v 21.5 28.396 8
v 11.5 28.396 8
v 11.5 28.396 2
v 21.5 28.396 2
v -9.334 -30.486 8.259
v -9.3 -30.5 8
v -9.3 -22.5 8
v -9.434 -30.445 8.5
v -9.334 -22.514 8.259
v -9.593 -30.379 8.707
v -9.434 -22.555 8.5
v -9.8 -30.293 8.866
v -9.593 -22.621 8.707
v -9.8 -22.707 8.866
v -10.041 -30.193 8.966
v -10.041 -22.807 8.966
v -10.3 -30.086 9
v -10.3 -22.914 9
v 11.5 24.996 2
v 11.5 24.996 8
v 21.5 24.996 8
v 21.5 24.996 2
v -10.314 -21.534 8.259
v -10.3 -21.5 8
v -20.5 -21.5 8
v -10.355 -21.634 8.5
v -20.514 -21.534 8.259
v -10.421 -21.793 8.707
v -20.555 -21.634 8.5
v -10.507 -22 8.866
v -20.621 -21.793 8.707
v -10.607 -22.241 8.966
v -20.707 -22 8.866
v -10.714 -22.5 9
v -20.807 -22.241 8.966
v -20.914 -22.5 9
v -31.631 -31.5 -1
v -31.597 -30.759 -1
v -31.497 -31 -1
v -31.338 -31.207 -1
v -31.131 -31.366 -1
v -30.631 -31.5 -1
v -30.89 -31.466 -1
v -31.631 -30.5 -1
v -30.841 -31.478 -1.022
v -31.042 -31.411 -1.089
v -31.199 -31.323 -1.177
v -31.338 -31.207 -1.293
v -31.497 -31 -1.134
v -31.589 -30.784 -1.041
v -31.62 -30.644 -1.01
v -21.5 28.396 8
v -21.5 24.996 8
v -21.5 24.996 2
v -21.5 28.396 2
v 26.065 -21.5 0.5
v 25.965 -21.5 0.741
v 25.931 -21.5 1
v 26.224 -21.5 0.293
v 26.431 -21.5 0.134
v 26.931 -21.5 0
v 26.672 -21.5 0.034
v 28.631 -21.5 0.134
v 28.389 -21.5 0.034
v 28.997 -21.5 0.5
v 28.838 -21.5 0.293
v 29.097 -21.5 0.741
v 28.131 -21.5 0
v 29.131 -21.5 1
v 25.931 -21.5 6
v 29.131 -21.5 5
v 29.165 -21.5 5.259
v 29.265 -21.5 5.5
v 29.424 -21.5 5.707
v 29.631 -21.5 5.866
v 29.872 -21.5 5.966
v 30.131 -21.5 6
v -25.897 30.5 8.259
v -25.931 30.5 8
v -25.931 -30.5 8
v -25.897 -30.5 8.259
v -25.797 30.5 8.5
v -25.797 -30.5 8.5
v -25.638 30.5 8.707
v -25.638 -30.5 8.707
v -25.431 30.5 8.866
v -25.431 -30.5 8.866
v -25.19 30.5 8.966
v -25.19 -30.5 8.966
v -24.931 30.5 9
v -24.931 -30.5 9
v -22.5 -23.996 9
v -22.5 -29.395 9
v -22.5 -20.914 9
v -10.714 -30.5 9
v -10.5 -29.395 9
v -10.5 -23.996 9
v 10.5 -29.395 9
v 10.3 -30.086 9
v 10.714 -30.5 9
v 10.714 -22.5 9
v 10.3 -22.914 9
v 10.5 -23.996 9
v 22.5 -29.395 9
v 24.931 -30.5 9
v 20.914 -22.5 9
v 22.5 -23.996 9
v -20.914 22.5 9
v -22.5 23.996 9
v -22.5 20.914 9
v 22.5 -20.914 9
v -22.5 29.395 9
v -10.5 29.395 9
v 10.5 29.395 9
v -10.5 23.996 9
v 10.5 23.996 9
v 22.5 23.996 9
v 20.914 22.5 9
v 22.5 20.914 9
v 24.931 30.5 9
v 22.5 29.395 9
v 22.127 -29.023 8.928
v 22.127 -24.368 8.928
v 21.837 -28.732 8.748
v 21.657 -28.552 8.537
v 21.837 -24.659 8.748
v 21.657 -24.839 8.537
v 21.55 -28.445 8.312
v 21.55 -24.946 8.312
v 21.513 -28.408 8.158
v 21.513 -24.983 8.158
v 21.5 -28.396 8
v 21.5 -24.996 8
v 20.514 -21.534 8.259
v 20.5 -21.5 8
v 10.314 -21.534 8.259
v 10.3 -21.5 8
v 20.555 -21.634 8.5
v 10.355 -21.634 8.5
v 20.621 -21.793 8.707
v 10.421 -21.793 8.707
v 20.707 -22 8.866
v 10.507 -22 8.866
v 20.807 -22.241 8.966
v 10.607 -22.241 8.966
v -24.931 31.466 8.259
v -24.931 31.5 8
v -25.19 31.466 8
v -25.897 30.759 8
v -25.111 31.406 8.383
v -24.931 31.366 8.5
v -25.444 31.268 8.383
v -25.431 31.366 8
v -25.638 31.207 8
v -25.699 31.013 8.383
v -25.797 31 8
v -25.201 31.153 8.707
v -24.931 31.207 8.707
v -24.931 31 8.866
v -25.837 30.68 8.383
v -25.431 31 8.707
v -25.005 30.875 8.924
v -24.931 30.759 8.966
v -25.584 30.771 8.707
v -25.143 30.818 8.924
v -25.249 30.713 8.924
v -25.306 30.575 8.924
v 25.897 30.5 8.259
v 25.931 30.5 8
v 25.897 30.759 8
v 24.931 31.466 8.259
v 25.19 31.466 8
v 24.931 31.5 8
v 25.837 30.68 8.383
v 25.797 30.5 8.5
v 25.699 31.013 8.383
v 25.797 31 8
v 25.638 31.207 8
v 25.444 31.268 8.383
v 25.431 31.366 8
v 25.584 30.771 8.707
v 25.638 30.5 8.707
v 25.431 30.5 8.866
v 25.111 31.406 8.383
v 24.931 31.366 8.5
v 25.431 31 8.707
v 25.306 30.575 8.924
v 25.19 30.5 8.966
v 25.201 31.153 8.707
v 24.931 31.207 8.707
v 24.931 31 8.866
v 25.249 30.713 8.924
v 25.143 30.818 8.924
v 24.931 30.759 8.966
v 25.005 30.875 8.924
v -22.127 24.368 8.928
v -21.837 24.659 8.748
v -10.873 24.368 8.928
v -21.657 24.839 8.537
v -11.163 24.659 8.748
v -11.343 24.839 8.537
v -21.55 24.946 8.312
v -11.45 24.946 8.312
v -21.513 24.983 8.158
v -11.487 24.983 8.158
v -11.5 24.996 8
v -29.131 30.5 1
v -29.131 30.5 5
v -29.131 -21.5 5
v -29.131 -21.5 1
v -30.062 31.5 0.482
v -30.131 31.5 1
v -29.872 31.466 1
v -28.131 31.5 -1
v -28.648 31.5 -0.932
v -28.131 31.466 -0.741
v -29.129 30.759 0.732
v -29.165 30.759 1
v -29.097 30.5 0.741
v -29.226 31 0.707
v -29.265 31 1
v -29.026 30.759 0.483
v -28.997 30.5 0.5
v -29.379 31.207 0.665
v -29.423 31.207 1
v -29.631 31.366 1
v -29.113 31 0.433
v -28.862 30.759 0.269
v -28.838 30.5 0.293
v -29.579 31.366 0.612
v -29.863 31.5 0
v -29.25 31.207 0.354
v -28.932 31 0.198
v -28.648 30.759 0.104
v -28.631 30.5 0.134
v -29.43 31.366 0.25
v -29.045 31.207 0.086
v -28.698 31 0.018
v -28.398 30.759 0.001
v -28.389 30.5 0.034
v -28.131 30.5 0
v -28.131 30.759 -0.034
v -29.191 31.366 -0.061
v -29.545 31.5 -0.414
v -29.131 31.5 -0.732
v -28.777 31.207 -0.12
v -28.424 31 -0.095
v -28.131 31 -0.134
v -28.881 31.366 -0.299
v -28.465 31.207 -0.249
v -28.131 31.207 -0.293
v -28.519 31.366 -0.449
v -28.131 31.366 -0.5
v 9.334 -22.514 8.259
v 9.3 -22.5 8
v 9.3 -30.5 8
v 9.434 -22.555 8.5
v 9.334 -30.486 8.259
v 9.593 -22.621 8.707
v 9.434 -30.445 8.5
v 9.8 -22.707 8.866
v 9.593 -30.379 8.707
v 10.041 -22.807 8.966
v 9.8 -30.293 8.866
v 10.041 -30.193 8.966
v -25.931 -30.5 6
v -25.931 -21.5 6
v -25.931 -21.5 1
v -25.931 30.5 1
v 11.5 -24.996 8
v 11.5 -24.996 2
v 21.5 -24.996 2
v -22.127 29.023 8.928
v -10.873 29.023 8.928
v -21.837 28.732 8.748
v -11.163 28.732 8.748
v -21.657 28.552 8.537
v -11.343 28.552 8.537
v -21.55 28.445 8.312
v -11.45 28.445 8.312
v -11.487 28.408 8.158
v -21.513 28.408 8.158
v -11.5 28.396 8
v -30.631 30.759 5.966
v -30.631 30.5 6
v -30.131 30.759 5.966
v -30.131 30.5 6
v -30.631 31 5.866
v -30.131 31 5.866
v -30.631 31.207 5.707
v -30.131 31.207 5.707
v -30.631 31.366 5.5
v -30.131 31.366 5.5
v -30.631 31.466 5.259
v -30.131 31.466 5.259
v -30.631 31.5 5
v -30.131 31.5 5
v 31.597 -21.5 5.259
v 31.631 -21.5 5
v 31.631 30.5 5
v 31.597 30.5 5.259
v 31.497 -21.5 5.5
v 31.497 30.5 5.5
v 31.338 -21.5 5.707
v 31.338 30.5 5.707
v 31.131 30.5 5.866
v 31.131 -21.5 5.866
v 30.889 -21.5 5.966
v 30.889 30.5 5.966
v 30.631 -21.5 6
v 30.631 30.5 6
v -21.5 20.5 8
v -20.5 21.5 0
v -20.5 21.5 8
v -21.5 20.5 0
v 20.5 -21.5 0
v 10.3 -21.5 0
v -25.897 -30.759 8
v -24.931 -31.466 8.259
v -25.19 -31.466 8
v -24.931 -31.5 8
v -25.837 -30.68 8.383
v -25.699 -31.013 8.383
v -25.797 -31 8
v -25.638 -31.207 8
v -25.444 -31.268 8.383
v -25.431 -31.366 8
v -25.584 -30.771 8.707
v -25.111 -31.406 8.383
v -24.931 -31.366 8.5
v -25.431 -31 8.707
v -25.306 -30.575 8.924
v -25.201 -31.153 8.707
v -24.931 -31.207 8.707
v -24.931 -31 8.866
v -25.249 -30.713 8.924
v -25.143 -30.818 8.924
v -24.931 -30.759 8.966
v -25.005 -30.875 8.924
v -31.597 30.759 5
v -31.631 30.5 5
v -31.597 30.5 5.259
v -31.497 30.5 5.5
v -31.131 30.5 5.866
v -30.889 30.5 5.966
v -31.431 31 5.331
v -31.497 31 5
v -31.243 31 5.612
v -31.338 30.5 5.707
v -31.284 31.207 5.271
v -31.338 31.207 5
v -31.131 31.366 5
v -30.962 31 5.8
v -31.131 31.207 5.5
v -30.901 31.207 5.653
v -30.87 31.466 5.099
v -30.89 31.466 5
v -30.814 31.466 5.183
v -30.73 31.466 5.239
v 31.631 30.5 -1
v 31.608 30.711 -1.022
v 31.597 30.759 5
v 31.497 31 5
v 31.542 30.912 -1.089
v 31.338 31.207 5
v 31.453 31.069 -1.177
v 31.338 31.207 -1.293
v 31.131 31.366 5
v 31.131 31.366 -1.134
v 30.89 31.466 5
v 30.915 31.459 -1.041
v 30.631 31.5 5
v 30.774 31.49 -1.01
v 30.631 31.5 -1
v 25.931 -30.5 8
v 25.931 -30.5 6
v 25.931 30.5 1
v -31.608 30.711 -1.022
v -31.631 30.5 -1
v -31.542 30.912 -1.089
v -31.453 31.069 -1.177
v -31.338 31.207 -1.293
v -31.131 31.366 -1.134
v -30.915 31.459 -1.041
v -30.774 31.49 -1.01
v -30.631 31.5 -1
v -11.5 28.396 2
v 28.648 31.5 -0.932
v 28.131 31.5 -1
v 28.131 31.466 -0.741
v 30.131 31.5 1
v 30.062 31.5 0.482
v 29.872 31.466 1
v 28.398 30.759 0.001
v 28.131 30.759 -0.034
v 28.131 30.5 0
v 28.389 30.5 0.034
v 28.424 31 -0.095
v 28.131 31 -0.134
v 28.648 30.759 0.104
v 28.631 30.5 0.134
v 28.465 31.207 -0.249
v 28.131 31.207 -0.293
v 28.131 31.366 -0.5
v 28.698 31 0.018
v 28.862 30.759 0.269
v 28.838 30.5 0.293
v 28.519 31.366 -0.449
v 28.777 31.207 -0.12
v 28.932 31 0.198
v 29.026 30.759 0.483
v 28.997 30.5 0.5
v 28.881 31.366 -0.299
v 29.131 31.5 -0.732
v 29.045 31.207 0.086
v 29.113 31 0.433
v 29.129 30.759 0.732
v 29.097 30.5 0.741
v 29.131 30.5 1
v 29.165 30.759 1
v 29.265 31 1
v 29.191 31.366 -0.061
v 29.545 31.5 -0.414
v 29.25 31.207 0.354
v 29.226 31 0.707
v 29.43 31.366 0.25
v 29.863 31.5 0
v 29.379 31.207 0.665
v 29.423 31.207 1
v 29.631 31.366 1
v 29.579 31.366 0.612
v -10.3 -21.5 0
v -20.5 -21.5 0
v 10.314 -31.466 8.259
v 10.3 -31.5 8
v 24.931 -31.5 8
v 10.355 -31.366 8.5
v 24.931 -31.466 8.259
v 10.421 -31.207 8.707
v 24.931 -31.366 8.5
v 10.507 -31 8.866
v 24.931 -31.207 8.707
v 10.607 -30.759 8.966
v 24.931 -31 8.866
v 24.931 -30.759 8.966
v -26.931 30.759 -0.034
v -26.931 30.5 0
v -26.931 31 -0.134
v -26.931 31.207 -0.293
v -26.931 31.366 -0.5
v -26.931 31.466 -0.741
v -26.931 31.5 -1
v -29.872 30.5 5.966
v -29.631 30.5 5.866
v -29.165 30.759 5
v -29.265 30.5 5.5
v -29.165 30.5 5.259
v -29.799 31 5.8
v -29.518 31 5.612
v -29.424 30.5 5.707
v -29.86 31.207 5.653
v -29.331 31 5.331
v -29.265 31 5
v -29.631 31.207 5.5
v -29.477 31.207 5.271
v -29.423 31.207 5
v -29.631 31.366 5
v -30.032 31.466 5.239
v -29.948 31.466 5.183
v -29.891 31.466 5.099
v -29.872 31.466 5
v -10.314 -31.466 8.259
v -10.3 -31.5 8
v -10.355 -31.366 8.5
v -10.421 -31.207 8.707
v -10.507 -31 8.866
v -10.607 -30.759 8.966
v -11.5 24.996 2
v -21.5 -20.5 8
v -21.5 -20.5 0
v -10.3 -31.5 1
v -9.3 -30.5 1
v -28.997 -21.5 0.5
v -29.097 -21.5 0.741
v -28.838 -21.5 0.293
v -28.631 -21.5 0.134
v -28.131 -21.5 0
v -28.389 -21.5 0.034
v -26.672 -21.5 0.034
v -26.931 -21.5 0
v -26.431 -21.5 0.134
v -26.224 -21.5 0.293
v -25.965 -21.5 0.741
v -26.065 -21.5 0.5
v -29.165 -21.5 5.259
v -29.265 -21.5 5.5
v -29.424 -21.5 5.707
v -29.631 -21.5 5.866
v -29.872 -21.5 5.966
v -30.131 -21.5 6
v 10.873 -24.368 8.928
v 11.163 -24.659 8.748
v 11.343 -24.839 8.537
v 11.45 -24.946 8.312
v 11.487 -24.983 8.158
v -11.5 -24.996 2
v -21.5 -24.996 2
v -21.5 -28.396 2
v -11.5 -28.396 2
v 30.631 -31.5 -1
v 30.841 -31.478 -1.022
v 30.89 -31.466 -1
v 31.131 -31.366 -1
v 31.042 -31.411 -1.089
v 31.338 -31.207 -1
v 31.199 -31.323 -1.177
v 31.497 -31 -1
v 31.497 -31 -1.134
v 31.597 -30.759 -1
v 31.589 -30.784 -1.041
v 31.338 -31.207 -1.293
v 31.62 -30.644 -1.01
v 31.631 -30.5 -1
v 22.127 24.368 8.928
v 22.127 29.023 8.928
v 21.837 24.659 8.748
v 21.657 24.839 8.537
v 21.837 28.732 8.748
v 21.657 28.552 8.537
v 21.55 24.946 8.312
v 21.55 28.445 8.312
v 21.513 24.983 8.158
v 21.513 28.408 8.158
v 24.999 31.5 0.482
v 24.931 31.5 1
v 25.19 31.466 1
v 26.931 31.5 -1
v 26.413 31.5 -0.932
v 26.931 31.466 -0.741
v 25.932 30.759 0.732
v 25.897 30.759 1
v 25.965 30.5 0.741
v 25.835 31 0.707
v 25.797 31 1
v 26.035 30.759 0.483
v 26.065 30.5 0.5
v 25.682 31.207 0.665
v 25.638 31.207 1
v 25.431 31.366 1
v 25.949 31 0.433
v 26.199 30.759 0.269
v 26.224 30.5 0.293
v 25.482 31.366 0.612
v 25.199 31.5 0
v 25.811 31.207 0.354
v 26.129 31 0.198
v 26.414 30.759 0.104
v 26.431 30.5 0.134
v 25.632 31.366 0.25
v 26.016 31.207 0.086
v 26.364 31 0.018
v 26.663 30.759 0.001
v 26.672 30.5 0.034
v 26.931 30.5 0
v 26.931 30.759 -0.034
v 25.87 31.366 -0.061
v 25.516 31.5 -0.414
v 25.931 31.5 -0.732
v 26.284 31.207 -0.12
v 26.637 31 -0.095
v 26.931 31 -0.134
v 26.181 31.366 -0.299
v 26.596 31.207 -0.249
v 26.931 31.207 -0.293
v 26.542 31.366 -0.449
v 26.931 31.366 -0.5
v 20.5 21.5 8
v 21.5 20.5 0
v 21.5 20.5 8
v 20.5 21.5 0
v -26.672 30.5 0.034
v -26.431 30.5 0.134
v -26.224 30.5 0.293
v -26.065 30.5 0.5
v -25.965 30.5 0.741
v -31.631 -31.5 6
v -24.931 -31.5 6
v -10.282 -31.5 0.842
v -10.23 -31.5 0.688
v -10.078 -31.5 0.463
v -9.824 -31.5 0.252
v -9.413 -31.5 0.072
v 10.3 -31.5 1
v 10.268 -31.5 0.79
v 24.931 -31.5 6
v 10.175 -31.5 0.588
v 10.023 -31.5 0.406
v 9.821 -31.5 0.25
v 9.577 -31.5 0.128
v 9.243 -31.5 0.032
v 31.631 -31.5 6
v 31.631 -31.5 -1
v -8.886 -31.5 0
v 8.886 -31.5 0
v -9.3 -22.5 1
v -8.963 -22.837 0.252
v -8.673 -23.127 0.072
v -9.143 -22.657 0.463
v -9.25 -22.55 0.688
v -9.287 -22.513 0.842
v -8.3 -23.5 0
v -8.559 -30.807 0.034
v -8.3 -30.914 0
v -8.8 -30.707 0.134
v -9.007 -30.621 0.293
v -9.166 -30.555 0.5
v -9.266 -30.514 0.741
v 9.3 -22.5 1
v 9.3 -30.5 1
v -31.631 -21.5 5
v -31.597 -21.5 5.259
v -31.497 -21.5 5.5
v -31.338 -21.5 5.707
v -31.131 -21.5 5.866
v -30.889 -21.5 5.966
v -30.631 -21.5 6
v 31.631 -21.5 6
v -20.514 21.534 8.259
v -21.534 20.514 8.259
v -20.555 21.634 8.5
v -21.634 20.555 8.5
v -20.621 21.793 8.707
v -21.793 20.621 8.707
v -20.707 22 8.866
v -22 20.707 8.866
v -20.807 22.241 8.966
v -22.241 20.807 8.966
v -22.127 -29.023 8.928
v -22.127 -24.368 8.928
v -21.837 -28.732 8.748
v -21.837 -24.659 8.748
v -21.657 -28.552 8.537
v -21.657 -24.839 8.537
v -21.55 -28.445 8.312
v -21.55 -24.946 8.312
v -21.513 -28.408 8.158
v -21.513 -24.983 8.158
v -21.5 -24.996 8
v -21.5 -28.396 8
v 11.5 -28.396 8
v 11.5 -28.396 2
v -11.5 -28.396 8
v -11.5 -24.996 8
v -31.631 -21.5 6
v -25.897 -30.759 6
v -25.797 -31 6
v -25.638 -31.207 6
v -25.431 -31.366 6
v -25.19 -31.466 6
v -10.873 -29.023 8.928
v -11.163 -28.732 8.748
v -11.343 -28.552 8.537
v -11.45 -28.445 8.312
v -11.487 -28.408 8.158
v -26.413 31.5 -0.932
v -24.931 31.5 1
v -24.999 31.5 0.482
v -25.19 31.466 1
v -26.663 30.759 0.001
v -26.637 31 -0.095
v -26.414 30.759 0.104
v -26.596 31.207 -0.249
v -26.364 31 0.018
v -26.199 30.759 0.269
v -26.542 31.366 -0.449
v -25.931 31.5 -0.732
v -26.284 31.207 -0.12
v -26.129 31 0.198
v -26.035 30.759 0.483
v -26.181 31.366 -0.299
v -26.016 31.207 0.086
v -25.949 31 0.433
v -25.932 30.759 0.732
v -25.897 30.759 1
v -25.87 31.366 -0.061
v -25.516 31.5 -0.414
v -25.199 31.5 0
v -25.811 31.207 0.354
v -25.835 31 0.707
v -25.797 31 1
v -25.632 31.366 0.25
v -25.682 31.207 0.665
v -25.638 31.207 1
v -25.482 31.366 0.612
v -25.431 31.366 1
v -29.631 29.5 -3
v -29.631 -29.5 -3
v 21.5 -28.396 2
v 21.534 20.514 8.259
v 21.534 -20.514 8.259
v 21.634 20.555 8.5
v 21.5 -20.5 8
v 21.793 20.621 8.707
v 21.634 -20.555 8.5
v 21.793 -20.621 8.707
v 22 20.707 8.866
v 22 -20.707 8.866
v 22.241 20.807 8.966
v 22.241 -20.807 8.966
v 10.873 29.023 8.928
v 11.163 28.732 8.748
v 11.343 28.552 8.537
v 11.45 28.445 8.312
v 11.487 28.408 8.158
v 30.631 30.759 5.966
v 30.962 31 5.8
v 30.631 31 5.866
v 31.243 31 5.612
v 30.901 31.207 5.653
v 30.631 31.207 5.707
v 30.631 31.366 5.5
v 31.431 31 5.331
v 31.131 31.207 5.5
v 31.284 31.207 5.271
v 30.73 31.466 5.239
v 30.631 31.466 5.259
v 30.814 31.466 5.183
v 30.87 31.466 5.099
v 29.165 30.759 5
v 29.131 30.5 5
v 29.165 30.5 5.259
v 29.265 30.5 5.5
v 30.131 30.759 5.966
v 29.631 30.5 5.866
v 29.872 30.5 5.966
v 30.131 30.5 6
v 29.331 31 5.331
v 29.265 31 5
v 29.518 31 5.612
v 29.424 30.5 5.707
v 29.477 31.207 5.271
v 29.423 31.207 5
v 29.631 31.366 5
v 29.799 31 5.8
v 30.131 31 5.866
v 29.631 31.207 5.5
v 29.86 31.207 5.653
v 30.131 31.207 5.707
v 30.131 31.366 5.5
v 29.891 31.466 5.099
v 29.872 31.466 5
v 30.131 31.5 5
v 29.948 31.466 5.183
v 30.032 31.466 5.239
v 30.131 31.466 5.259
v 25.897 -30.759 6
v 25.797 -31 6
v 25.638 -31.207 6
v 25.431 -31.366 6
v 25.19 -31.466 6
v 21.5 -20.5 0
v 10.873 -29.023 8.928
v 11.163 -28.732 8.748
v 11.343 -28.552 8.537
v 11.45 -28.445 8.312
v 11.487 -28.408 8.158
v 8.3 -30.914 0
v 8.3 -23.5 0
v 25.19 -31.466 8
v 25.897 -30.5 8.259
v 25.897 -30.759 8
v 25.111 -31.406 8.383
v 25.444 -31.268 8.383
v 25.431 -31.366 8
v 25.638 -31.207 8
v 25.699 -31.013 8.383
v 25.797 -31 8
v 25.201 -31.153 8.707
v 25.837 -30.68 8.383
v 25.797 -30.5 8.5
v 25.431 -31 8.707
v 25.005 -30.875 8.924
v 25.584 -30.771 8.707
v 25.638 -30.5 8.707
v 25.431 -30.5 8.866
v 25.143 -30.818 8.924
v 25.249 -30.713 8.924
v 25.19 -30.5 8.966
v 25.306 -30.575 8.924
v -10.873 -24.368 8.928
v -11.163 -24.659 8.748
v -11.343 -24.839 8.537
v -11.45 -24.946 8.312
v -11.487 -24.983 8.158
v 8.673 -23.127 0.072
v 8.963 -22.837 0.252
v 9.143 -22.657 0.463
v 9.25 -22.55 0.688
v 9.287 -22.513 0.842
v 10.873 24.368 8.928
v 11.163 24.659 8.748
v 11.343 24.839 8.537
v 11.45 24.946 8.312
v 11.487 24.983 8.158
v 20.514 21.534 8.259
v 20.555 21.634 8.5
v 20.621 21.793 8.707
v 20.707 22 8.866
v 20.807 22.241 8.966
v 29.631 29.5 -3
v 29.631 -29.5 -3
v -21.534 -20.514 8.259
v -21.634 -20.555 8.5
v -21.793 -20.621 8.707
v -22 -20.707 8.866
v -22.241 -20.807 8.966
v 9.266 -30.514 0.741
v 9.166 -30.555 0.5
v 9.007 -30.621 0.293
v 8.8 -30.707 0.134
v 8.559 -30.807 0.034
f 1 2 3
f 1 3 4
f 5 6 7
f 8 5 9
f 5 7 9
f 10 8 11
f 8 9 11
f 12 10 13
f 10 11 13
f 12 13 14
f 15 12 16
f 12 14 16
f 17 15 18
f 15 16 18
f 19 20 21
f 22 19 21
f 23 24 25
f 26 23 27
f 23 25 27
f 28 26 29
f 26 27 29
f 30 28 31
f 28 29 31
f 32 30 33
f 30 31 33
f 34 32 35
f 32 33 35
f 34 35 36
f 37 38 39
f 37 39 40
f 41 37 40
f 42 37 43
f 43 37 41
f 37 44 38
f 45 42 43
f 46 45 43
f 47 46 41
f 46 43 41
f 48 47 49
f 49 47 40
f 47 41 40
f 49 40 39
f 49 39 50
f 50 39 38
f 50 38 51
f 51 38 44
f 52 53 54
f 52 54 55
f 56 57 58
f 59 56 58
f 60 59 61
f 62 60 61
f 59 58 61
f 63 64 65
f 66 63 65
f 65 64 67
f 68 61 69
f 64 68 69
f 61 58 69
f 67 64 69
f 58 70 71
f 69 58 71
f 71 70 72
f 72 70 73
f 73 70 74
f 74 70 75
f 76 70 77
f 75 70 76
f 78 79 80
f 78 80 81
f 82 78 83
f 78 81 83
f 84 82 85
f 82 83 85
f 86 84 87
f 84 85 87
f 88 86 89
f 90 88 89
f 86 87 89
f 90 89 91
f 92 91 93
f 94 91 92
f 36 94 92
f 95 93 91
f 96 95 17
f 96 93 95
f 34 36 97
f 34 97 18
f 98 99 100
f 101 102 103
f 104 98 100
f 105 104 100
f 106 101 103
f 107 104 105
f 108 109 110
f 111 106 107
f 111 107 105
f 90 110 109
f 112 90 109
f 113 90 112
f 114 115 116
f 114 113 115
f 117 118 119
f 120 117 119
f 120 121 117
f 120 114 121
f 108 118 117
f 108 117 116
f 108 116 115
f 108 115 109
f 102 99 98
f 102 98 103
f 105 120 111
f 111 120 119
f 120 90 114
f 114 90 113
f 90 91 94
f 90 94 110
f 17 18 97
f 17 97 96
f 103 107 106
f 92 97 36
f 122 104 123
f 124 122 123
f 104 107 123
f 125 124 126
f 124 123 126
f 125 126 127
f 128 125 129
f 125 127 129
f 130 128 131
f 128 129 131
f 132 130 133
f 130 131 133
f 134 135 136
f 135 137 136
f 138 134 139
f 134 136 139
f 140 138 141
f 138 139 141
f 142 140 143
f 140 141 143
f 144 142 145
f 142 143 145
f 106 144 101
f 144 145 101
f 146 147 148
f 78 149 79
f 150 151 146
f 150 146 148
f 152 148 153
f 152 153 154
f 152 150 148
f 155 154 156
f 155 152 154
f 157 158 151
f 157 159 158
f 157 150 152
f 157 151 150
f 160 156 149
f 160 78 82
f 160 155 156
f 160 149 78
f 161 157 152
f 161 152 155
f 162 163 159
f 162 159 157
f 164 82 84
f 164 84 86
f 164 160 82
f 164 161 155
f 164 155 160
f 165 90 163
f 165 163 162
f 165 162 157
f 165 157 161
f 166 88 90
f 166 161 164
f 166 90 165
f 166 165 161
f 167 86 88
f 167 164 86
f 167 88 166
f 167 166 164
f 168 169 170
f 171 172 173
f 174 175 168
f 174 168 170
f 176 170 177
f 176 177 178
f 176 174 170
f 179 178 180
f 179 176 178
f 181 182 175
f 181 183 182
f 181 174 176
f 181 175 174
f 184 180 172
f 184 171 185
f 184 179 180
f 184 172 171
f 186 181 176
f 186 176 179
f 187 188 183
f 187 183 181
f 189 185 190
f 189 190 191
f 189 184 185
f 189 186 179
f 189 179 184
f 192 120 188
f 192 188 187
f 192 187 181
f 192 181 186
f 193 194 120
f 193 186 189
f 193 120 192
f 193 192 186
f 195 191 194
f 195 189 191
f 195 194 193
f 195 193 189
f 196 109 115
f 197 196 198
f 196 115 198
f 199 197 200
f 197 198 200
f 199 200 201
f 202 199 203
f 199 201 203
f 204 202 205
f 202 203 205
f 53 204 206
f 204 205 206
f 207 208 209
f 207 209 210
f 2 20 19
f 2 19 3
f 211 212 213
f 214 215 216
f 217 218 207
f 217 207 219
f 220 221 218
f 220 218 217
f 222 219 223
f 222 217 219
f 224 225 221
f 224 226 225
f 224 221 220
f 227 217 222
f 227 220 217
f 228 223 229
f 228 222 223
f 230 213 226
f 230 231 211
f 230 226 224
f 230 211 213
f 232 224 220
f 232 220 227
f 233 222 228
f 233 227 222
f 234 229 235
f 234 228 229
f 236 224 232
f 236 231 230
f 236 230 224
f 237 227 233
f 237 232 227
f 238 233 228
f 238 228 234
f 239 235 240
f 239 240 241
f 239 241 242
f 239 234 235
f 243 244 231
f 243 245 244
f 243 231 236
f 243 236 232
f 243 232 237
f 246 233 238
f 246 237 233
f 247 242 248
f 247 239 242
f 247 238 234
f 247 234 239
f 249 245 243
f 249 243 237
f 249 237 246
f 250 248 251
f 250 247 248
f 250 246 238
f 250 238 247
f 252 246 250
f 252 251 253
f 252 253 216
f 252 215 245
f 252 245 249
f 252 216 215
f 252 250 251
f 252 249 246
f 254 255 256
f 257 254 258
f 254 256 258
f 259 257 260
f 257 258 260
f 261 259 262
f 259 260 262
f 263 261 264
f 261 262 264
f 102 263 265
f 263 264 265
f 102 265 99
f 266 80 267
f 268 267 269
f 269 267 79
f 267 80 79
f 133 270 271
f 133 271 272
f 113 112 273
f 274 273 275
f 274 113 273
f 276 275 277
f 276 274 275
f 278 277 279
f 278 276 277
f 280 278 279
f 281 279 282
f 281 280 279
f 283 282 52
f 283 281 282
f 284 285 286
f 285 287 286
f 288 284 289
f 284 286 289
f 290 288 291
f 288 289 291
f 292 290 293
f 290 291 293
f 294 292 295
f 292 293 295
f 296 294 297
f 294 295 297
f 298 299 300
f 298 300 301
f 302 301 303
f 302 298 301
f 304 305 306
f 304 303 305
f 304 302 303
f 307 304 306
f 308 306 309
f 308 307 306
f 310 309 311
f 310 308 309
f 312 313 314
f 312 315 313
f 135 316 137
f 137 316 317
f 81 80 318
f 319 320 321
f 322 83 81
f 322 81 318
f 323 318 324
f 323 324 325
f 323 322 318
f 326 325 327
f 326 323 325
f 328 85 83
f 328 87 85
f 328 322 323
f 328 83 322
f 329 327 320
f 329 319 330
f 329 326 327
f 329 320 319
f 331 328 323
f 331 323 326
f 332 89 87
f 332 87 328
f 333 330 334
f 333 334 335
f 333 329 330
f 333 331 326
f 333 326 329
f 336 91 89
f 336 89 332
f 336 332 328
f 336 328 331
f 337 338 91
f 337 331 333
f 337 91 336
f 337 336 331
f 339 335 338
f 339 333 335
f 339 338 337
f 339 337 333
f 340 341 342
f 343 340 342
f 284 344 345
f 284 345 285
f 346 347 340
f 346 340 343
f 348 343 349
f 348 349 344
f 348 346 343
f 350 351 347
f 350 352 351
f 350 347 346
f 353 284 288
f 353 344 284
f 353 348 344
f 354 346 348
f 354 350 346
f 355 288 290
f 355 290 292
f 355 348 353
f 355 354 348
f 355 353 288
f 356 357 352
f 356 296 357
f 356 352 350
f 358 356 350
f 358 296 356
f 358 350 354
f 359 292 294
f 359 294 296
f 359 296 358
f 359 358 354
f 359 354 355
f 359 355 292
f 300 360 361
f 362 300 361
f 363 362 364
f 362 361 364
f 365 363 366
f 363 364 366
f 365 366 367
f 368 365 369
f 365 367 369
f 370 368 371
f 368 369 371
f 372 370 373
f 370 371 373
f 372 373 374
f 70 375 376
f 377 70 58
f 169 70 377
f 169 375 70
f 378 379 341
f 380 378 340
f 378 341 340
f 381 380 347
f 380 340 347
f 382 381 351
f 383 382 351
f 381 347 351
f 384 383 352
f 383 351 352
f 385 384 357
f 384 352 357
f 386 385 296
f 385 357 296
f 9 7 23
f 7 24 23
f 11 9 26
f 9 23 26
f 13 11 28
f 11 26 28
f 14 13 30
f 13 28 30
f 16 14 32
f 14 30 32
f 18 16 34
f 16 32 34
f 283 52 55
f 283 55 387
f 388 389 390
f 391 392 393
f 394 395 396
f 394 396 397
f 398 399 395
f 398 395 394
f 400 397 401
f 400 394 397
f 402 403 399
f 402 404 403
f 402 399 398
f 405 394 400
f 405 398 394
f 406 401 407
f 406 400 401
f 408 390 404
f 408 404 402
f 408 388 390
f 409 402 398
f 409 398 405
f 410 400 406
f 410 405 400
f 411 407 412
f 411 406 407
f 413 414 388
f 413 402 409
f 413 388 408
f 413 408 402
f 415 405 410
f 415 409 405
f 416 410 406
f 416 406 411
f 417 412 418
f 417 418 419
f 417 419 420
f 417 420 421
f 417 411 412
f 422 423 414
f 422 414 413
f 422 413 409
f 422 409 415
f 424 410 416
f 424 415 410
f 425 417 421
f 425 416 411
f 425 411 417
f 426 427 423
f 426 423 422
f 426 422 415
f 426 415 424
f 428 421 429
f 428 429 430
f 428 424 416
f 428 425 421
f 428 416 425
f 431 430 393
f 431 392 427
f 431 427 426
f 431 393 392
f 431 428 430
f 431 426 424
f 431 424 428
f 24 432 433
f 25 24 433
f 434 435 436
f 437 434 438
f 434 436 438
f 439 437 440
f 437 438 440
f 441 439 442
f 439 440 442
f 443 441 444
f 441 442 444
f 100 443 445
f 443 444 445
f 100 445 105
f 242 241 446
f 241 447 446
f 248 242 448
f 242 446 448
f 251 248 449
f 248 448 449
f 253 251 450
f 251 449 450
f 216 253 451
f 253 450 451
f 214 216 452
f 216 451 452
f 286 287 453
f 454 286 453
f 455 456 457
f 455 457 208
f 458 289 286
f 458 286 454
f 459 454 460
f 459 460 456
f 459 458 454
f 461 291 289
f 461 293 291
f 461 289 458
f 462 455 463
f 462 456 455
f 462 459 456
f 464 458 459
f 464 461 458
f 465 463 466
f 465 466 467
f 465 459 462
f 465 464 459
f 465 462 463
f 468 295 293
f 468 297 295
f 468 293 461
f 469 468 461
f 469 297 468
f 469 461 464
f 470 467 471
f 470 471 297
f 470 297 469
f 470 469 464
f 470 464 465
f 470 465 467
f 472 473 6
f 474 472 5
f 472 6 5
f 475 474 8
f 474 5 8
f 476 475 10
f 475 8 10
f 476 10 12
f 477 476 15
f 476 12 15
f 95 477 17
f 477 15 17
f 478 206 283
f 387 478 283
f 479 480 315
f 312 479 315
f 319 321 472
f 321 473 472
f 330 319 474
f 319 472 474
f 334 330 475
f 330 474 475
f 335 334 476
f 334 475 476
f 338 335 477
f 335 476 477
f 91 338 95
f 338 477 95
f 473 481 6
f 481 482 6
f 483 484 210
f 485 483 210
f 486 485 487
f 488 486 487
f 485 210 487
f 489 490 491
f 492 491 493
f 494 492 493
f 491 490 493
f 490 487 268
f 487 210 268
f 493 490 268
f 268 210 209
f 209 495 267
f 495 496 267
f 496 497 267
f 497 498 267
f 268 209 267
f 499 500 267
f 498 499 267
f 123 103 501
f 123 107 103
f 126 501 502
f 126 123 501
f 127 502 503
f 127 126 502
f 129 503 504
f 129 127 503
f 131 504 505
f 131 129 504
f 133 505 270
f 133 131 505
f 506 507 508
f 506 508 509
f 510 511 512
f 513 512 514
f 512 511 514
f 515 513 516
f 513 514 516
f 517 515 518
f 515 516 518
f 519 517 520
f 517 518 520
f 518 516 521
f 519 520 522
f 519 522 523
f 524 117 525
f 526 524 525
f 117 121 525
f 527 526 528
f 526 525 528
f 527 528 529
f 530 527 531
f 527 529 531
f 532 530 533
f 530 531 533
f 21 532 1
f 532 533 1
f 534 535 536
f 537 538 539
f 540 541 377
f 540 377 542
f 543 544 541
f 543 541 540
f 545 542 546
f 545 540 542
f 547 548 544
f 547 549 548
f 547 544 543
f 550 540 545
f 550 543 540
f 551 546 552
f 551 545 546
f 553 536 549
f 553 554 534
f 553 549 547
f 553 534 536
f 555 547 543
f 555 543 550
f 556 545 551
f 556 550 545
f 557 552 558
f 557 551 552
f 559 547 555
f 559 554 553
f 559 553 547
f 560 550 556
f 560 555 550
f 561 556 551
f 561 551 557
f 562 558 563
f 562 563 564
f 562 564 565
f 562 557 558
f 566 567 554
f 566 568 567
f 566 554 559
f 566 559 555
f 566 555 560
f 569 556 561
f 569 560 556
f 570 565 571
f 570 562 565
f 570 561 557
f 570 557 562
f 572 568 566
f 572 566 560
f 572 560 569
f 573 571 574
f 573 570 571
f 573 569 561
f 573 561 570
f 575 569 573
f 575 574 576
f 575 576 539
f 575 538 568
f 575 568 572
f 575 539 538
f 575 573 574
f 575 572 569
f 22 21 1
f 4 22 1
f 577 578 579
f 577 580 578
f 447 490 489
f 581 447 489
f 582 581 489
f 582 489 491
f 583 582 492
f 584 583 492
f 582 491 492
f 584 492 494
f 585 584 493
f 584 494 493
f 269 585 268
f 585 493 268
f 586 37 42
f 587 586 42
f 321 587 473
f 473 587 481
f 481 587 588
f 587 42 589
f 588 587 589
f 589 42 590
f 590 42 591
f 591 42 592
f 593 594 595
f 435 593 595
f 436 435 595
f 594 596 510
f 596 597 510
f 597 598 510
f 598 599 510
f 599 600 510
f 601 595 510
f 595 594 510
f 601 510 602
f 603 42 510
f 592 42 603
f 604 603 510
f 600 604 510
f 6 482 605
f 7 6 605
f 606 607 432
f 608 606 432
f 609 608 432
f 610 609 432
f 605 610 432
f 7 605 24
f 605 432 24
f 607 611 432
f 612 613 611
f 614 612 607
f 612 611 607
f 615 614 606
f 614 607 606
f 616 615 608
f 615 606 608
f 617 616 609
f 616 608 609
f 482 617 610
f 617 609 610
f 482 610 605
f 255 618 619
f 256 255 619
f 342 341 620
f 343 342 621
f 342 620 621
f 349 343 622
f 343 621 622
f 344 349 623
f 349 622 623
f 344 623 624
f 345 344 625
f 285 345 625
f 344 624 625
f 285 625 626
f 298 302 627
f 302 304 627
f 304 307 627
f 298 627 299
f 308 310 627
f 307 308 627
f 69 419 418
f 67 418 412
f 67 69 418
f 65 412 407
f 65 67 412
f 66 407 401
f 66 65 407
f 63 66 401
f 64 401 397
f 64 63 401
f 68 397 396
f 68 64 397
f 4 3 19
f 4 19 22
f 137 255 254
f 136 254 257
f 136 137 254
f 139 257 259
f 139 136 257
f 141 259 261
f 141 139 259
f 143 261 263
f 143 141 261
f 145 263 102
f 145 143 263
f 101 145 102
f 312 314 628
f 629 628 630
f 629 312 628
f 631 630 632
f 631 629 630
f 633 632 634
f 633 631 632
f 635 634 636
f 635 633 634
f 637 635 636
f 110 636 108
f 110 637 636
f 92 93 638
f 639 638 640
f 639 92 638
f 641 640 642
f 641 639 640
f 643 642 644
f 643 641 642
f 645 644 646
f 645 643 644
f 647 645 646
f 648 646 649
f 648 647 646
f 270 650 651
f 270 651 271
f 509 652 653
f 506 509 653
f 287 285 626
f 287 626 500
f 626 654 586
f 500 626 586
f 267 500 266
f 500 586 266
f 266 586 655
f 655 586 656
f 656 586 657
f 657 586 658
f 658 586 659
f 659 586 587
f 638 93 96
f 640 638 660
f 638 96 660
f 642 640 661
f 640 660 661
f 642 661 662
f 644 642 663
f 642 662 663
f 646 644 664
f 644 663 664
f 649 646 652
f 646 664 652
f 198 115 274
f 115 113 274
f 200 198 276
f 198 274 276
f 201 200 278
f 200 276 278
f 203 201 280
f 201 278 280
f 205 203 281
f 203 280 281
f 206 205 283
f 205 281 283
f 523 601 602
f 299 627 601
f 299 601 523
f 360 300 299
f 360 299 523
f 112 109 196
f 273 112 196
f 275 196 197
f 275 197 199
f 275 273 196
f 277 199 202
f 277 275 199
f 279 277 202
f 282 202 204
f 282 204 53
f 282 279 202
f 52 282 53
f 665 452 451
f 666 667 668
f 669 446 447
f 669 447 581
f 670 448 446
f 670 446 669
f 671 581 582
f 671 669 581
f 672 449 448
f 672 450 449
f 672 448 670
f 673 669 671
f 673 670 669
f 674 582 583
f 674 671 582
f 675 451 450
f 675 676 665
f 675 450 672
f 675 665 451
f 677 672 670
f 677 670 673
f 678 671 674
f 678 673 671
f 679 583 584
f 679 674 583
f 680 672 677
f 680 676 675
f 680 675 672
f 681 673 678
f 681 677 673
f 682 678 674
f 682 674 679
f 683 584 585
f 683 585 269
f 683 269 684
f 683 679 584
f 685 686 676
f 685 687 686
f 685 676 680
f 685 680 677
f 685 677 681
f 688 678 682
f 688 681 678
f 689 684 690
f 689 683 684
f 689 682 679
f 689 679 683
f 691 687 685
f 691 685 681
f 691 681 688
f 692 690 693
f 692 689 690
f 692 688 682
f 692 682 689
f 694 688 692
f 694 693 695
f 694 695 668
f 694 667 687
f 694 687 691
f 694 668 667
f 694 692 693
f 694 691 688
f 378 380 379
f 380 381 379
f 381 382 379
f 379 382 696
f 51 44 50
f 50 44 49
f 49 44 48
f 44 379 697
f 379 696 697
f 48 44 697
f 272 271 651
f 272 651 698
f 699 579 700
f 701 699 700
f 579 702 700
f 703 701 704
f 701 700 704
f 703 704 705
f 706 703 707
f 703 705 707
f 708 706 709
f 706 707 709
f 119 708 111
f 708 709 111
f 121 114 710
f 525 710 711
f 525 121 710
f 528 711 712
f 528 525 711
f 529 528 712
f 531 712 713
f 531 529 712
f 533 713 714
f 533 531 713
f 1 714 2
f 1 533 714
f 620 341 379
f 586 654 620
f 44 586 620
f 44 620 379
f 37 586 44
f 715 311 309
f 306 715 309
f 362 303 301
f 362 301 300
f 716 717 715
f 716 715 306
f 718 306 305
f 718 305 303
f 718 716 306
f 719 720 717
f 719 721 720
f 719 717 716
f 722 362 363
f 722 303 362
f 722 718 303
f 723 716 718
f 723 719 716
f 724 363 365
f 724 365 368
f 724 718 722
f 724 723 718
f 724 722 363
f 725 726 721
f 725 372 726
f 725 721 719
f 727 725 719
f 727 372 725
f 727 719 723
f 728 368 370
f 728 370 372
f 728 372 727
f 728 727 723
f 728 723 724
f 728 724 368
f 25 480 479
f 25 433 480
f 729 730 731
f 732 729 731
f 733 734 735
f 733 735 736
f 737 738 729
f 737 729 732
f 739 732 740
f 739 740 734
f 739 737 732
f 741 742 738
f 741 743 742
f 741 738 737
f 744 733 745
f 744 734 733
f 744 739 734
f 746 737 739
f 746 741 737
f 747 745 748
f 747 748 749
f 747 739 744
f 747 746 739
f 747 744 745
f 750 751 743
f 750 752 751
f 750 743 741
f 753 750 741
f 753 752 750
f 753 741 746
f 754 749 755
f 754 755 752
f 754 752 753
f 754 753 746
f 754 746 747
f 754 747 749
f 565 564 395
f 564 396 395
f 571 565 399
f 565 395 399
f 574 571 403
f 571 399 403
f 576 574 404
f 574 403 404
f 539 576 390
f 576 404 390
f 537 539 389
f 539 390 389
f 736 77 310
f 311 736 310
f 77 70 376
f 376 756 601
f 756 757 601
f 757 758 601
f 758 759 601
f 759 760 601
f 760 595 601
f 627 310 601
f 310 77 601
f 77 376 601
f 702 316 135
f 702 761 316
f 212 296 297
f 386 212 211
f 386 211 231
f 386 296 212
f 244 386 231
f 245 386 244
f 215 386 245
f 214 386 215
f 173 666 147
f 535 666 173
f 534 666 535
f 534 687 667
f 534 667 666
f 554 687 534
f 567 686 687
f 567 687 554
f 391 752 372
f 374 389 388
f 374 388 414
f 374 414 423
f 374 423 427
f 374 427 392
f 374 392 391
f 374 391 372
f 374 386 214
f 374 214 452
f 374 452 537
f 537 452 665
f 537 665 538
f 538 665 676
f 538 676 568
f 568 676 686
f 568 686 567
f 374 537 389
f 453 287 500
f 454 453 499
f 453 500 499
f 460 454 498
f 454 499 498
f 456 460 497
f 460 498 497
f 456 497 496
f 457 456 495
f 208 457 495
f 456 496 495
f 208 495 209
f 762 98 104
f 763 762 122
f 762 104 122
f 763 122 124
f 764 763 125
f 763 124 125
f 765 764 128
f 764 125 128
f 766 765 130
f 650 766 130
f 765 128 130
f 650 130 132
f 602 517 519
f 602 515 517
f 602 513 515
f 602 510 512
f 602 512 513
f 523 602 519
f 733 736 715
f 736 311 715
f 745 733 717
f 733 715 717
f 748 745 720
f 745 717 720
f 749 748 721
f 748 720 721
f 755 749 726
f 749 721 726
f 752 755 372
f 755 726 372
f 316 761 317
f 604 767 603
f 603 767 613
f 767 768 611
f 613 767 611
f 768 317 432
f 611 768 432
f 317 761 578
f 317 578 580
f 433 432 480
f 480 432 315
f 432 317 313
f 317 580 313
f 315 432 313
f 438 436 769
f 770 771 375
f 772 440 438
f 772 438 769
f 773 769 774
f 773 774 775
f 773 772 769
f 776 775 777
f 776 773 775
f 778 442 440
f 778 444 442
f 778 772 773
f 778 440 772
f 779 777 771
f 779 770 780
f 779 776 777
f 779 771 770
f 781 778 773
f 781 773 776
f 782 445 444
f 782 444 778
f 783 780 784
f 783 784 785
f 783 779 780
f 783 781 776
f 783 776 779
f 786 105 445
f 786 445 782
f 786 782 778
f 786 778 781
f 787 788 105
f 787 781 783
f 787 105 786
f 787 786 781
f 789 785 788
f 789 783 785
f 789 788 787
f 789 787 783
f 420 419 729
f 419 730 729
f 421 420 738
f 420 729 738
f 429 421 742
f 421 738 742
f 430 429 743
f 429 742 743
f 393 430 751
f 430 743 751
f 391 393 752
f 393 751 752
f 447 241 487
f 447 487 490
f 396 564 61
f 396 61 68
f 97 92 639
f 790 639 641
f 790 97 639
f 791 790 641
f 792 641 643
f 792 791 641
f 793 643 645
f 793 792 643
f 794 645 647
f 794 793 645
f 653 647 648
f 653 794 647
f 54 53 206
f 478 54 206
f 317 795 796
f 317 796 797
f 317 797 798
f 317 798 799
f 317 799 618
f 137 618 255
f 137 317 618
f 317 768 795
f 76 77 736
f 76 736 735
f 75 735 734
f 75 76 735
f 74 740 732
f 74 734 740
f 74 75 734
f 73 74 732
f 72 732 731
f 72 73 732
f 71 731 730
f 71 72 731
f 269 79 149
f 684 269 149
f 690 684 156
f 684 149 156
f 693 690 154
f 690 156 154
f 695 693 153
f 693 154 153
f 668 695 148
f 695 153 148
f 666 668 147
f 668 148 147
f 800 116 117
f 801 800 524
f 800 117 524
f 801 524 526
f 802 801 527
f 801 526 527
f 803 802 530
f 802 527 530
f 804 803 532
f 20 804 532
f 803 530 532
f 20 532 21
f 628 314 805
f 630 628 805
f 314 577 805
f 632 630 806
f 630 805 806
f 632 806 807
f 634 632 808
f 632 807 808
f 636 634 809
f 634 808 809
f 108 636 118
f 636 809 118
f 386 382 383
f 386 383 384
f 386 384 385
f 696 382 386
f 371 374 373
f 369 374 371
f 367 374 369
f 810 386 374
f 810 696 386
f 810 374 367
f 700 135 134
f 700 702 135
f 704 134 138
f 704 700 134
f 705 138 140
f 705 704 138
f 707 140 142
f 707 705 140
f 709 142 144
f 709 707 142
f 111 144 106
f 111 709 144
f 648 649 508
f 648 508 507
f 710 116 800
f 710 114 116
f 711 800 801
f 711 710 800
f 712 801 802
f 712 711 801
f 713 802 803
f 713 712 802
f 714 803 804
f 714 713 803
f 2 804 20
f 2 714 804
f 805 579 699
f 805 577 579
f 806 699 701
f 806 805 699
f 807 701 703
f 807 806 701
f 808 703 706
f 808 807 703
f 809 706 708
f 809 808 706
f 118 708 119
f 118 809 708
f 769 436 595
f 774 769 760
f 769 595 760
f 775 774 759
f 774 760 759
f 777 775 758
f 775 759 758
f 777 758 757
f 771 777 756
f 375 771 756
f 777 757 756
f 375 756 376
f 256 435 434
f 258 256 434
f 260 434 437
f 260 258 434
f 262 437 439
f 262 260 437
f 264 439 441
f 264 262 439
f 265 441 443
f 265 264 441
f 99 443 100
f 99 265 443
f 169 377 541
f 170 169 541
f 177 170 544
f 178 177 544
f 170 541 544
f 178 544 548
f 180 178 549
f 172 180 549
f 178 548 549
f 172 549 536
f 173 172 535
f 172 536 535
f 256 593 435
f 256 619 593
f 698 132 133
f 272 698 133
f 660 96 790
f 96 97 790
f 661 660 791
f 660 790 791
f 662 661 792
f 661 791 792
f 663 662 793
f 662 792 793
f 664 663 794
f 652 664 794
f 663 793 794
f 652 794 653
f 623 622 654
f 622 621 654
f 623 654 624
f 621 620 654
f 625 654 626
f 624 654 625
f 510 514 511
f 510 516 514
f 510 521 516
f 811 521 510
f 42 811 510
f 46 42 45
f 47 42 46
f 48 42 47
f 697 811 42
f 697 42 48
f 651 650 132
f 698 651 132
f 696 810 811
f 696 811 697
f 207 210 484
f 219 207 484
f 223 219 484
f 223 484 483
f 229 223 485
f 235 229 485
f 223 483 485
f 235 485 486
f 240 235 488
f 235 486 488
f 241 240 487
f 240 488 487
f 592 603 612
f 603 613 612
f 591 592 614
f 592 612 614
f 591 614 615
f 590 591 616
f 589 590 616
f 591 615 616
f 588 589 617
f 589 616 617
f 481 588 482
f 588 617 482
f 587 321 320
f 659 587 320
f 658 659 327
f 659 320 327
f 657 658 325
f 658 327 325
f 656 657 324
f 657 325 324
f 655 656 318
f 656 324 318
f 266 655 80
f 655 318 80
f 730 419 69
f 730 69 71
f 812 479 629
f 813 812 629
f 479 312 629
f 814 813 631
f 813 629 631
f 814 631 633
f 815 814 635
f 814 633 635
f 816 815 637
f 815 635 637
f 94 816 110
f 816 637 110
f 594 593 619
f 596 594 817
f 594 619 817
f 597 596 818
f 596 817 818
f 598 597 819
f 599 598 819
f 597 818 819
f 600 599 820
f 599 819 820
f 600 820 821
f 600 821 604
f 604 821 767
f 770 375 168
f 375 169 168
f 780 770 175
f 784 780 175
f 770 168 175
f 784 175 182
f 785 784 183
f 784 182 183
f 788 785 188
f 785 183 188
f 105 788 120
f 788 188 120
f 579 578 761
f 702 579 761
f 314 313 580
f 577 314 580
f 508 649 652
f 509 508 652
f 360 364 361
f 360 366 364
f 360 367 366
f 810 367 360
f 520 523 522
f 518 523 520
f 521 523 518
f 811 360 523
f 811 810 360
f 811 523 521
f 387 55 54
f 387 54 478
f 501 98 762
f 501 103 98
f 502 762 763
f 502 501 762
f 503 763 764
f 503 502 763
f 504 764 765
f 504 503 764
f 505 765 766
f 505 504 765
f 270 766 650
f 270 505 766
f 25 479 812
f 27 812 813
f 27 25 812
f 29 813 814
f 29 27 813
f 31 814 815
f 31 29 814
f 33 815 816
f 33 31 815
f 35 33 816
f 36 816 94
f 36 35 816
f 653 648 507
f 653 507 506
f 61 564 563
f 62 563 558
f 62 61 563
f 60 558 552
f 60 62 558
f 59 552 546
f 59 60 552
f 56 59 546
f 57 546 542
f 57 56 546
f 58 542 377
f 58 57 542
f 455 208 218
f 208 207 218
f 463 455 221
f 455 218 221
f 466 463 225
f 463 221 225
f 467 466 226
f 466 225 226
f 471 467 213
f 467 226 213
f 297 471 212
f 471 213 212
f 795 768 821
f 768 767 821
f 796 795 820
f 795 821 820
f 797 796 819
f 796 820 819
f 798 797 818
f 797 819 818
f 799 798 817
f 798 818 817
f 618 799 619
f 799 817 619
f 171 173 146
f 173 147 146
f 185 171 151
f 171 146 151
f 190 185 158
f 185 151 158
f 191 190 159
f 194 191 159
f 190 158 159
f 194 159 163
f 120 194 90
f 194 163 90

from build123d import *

# Parameters (mm, degrees)
BOSS_EXTRU_2_DEPTH      = 9
ESQUISSE3_W             = 51.8612703
ESQUISSE3_H             = 63
BOSS_EXTRU_3_DEPTH      = 3
ESQUISSE4_W             = 10
ESQUISSE4_H             = 3.4
ENL_V_MAT_EXTRU_1_DEPTH = 7
ESQUISSE5_W             = 3.2
ESQUISSE5_H             = 3
BOSS_EXTRU_4_DEPTH      = 63
CHANFREIN1_SIZE         = 1
CHANFREIN2_SIZE         = 2
CONG_1_R                = 1
CONG_2_R                = 1
CHANFREIN4_SIZE         = 1
CONG_4_R                = 1
CONG_5_R                = 1
ESQUISSE6_W             = 6.7
ESQUISSE6_H             = 1
BOSS_EXTRU_5_DEPTH      = 10


with BuildPart() as part:
    # Esquisse2 → Boss.-Extru.2 (new body)
    with BuildSketch(Plane.XY):
        Polygon((-9.3, -31.5), (-9.3, -21.5), (-21.5, -21.5), (-21.5, 21.5), (21.5, 21.5), (21.5, -21.5), (9.3, -21.5), (9.3, -31.5), (25.93063515, -31.5), (25.93063515, 31.5), (-25.93063515, 31.5), (-25.93063515, -31.5), align=None)
    extrude(amount=BOSS_EXTRU_2_DEPTH)

    # Esquisse3 → Boss.-Extru.3 (add)
    with BuildSketch(Plane(origin=(0, 0, 0), x_dir=(-1, 0, 0), z_dir=(0, 0, -1))):
        Rectangle(ESQUISSE3_W, ESQUISSE3_H)
    extrude(amount=BOSS_EXTRU_3_DEPTH)

    # Esquisse4 → Enlèv. mat.-Extru.1 (cut)
    with BuildSketch(Plane.XY.offset(9)):
        with Locations((-16.5, -26.695538472)):
            Rectangle(ESQUISSE4_W, ESQUISSE4_H)
        with Locations((16.5, -26.695538472)):
            Rectangle(ESQUISSE4_W, ESQUISSE4_H)
        with Locations((16.5, 26.695538472)):
            Rectangle(ESQUISSE4_W, ESQUISSE4_H)
        with Locations((-16.5, 26.695538472)):
            Rectangle(ESQUISSE4_W, ESQUISSE4_H)
    extrude(amount=-ENL_V_MAT_EXTRU_1_DEPTH, mode=Mode.SUBTRACT)

    # Esquisse5 → Boss.-Extru.4 (add)
    with BuildSketch(Plane(origin=(0, 31.5, 0), x_dir=(1, 0, 0), z_dir=(0, 1, 0))):
        Polygon((-29.13063515, 0), (-29.13063515, 3), (-31.63063515, 3), (-31.63063515, -6), (-29.13063515, -6), align=None)
        with Locations((-27.53063515, 1.5)):
            Rectangle(ESQUISSE5_W, ESQUISSE5_H)
        with Locations((27.53063515, 1.5)):
            Rectangle(ESQUISSE5_W, ESQUISSE5_H)
        Polygon((29.13063515, 3), (29.13063515, 0), (29.13063515, -6), (31.63063515, -6), (31.63063515, 3), align=None)
    extrude(amount=-BOSS_EXTRU_4_DEPTH)

    # Chanfrein1
    chanfrein1_edges = [part.edges().sort_by_distance(p)[0] for p in [
        (21.5, -21.5, 4.5),
        (21.5, 21.5, 4.5),
        (-21.5, 21.5, 4.5),
        (-21.5, -21.5, 4.5),
    ]]
    chamfer(chanfrein1_edges, length=CHANFREIN1_SIZE)

    # Chanfrein2
    chanfrein2_edges = [part.edges().sort_by_distance(p)[0] for p in [
        (-31.63063515, 0, -3),
        (31.63063515, 0, -3),
        (0, -31.5, -3),
        (0, 31.5, -3),
    ]]
    chamfer(chanfrein2_edges, length=CHANFREIN2_SIZE)

    # Congé1
    cong_1_edges = [part.edges().sort_by_distance(p)[0] for p in [
        (-25.93063515, 0, 0),
        (-29.13063515, 0, 0),
        (-29.13063515, 0, 6),
        (-31.63063515, 0, 6),
        (25.93063515, 0, 0),
        (29.13063515, 0, 0),
        (29.13063515, 0, 6),
        (31.63063515, 0, 6),
    ]]
    fillet(cong_1_edges, radius=CONG_1_R)

    # Congé2
    cong_2_edges = [part.edges().sort_by_distance(p)[0] for p in [
        (-31.63063515, 31.5, 2),
        (31.63063515, 31.5, 2),
        (30.38063515, -31.5, 6),
        (30.38063515, 31.5, 6),
        (-30.38063515, 31.5, 6),
        (-29.13063515, 31.5, 3),
        (-27.53063515, 31.5, 0),
        (27.53063515, 31.5, 0),
        (29.13063515, 31.5, 3),
        (-31.337741931, 31.5, 5.707106781),
        (-29.423528369, 31.5, 5.707106781),
        (29.423528369, 31.5, 5.707106781),
        (31.337741931, 31.5, 5.707106781),
        (31.63063515, -31.5, 2),
        (-31.63063515, -31.5, 2),
        (29.13063515, -31.5, 3),
        (27.53063515, -31.5, 0),
        (-27.53063515, -31.5, 0),
        (-29.13063515, -31.5, 3),
        (-30.38063515, -31.5, 6),
        (-31.337741931, -31.5, 5.707106781),
        (-29.423528369, -31.5, 5.707106781),
        (29.423528369, -31.5, 5.707106781),
        (31.337741931, -31.5, 5.707106781),
        (28.837741931, 31.5, 0.292893219),
        (28.837741931, -31.5, 0.292893219),
        (26.223528369, 31.5, 0.292893219),
        (26.223528369, -31.5, 0.292893219),
        (-28.837741931, 31.5, 0.292893219),
        (-28.837741931, -31.5, 0.292893219),
        (-26.223528369, 31.5, 0.292893219),
        (-26.223528369, -31.5, 0.292893219),
        (-25.93063515, -31.5, 5),
        (-25.93063515, 31.5, 5),
        (25.93063515, 31.5, 5),
        (25.93063515, -31.5, 5),
    ]]
    fillet(cong_2_edges, radius=CONG_2_R - 0.0001)  # a hair under: the kernel refuses the full size

    # Chanfrein4
    chanfrein4_edges = [part.edges().sort_by_distance(p)[0] for p in [
        (-9.3, -31.5, 4.5),
        (9.3, -31.5, 4.5),
        (9.3, -21.5, 4.5),
        (-9.3, -21.5, 4.5),
    ]]
    chamfer(chanfrein4_edges, length=CHANFREIN4_SIZE)

    # Congé4
    cong_4_edges = [part.edges().sort_by_distance(p)[0] for p in [
        (-21.5, 0, 9),
        (-15.4, -21.5, 9),
        (21.5, 0, 9),
        (0, 21.5, 9),
        (-21, -21, 9),
        (21, -21, 9),
        (21, 21, 9),
        (-21, 21, 9),
        (0, 31.5, 9),
        (-17.615367575, -31.5, 9),
        (-25.93063515, 0, 9),
        (25.93063515, 0, 9),
        (25.63777122, 31.207136071, 9),
        (25.63777122, -31.207136071, 9),
        (-25.63777122, -31.207136071, 9),
        (-25.63777122, 31.207136071, 9),
        (17.615367575, -31.5, 9),
        (9.3, -26.5, 9),
        (-9.3, -26.5, 9),
        (15.4, -21.5, 9),
        (-9.8, -22, 9),
        (9.8, -22, 9),
        (-9.8, -31, 9),
        (9.8, -31, 9),
        (-16.5, 28.395538472, 9),
        (-11.5, 26.695538472, 9),
        (-21.5, 26.695538472, 9),
        (-16.5, 24.995538472, 9),
        (21.5, 26.695538472, 9),
        (16.5, 24.995538472, 9),
        (16.5, 28.395538472, 9),
        (11.5, 26.695538472, 9),
        (16.5, -28.395538472, 9),
        (11.5, -26.695538472, 9),
        (21.5, -26.695538472, 9),
        (16.5, -24.995538472, 9),
        (-21.5, -26.695538472, 9),
        (-16.5, -24.995538472, 9),
        (-16.5, -28.395538472, 9),
        (-11.5, -26.695538472, 9),
    ]]
    fillet(cong_4_edges, radius=CONG_4_R - 0.0001)  # a hair under: the kernel refuses the full size

    # Congé5
    cong_5_edges = [part.edges().sort_by_distance(p)[0] for p in [
        (9.3, -26.5, 0),
        (-9.3, -26.5, 0),
        (9.8, -31, 0),
        (-9.8, -31, 0),
    ]]
    fillet(cong_5_edges, radius=CONG_5_R)

    # Esquisse6 → Boss.-Extru.5 (add)
    with BuildSketch(Plane.XZ.offset(31.5)):
        with BuildLine():
            Line((-24.93063515, 1), (-24.93063515, 5))
            Line((-24.93063515, 5), (-31.63063515, 5))
            Line((-31.63063515, 5), (-31.63063515, -1))
            Line((-31.63063515, -1), (-26.93063515, -1))
            ThreePointArc((-26.93063515, -1), (-25.516421587, -0.414213562), (-24.93063515, 1))
        make_face()
        with Locations((-28.28063515, 5.5)):
            Rectangle(ESQUISSE6_W, ESQUISSE6_H)
        with BuildLine():
            Line((31.63063515, -1), (31.63063515, 5))
            Line((31.63063515, 5), (24.93063515, 5))
            Line((24.93063515, 5), (24.93063515, 1))
            ThreePointArc((24.93063515, 1), (25.516421587, -0.414213562), (26.93063515, -1))
            Line((26.93063515, -1), (31.63063515, -1))
        make_face()
        with Locations((28.28063515, 5.5)):
            Rectangle(ESQUISSE6_W, ESQUISSE6_H)
    extrude(amount=-BOSS_EXTRU_5_DEPTH)


solid = part.part
